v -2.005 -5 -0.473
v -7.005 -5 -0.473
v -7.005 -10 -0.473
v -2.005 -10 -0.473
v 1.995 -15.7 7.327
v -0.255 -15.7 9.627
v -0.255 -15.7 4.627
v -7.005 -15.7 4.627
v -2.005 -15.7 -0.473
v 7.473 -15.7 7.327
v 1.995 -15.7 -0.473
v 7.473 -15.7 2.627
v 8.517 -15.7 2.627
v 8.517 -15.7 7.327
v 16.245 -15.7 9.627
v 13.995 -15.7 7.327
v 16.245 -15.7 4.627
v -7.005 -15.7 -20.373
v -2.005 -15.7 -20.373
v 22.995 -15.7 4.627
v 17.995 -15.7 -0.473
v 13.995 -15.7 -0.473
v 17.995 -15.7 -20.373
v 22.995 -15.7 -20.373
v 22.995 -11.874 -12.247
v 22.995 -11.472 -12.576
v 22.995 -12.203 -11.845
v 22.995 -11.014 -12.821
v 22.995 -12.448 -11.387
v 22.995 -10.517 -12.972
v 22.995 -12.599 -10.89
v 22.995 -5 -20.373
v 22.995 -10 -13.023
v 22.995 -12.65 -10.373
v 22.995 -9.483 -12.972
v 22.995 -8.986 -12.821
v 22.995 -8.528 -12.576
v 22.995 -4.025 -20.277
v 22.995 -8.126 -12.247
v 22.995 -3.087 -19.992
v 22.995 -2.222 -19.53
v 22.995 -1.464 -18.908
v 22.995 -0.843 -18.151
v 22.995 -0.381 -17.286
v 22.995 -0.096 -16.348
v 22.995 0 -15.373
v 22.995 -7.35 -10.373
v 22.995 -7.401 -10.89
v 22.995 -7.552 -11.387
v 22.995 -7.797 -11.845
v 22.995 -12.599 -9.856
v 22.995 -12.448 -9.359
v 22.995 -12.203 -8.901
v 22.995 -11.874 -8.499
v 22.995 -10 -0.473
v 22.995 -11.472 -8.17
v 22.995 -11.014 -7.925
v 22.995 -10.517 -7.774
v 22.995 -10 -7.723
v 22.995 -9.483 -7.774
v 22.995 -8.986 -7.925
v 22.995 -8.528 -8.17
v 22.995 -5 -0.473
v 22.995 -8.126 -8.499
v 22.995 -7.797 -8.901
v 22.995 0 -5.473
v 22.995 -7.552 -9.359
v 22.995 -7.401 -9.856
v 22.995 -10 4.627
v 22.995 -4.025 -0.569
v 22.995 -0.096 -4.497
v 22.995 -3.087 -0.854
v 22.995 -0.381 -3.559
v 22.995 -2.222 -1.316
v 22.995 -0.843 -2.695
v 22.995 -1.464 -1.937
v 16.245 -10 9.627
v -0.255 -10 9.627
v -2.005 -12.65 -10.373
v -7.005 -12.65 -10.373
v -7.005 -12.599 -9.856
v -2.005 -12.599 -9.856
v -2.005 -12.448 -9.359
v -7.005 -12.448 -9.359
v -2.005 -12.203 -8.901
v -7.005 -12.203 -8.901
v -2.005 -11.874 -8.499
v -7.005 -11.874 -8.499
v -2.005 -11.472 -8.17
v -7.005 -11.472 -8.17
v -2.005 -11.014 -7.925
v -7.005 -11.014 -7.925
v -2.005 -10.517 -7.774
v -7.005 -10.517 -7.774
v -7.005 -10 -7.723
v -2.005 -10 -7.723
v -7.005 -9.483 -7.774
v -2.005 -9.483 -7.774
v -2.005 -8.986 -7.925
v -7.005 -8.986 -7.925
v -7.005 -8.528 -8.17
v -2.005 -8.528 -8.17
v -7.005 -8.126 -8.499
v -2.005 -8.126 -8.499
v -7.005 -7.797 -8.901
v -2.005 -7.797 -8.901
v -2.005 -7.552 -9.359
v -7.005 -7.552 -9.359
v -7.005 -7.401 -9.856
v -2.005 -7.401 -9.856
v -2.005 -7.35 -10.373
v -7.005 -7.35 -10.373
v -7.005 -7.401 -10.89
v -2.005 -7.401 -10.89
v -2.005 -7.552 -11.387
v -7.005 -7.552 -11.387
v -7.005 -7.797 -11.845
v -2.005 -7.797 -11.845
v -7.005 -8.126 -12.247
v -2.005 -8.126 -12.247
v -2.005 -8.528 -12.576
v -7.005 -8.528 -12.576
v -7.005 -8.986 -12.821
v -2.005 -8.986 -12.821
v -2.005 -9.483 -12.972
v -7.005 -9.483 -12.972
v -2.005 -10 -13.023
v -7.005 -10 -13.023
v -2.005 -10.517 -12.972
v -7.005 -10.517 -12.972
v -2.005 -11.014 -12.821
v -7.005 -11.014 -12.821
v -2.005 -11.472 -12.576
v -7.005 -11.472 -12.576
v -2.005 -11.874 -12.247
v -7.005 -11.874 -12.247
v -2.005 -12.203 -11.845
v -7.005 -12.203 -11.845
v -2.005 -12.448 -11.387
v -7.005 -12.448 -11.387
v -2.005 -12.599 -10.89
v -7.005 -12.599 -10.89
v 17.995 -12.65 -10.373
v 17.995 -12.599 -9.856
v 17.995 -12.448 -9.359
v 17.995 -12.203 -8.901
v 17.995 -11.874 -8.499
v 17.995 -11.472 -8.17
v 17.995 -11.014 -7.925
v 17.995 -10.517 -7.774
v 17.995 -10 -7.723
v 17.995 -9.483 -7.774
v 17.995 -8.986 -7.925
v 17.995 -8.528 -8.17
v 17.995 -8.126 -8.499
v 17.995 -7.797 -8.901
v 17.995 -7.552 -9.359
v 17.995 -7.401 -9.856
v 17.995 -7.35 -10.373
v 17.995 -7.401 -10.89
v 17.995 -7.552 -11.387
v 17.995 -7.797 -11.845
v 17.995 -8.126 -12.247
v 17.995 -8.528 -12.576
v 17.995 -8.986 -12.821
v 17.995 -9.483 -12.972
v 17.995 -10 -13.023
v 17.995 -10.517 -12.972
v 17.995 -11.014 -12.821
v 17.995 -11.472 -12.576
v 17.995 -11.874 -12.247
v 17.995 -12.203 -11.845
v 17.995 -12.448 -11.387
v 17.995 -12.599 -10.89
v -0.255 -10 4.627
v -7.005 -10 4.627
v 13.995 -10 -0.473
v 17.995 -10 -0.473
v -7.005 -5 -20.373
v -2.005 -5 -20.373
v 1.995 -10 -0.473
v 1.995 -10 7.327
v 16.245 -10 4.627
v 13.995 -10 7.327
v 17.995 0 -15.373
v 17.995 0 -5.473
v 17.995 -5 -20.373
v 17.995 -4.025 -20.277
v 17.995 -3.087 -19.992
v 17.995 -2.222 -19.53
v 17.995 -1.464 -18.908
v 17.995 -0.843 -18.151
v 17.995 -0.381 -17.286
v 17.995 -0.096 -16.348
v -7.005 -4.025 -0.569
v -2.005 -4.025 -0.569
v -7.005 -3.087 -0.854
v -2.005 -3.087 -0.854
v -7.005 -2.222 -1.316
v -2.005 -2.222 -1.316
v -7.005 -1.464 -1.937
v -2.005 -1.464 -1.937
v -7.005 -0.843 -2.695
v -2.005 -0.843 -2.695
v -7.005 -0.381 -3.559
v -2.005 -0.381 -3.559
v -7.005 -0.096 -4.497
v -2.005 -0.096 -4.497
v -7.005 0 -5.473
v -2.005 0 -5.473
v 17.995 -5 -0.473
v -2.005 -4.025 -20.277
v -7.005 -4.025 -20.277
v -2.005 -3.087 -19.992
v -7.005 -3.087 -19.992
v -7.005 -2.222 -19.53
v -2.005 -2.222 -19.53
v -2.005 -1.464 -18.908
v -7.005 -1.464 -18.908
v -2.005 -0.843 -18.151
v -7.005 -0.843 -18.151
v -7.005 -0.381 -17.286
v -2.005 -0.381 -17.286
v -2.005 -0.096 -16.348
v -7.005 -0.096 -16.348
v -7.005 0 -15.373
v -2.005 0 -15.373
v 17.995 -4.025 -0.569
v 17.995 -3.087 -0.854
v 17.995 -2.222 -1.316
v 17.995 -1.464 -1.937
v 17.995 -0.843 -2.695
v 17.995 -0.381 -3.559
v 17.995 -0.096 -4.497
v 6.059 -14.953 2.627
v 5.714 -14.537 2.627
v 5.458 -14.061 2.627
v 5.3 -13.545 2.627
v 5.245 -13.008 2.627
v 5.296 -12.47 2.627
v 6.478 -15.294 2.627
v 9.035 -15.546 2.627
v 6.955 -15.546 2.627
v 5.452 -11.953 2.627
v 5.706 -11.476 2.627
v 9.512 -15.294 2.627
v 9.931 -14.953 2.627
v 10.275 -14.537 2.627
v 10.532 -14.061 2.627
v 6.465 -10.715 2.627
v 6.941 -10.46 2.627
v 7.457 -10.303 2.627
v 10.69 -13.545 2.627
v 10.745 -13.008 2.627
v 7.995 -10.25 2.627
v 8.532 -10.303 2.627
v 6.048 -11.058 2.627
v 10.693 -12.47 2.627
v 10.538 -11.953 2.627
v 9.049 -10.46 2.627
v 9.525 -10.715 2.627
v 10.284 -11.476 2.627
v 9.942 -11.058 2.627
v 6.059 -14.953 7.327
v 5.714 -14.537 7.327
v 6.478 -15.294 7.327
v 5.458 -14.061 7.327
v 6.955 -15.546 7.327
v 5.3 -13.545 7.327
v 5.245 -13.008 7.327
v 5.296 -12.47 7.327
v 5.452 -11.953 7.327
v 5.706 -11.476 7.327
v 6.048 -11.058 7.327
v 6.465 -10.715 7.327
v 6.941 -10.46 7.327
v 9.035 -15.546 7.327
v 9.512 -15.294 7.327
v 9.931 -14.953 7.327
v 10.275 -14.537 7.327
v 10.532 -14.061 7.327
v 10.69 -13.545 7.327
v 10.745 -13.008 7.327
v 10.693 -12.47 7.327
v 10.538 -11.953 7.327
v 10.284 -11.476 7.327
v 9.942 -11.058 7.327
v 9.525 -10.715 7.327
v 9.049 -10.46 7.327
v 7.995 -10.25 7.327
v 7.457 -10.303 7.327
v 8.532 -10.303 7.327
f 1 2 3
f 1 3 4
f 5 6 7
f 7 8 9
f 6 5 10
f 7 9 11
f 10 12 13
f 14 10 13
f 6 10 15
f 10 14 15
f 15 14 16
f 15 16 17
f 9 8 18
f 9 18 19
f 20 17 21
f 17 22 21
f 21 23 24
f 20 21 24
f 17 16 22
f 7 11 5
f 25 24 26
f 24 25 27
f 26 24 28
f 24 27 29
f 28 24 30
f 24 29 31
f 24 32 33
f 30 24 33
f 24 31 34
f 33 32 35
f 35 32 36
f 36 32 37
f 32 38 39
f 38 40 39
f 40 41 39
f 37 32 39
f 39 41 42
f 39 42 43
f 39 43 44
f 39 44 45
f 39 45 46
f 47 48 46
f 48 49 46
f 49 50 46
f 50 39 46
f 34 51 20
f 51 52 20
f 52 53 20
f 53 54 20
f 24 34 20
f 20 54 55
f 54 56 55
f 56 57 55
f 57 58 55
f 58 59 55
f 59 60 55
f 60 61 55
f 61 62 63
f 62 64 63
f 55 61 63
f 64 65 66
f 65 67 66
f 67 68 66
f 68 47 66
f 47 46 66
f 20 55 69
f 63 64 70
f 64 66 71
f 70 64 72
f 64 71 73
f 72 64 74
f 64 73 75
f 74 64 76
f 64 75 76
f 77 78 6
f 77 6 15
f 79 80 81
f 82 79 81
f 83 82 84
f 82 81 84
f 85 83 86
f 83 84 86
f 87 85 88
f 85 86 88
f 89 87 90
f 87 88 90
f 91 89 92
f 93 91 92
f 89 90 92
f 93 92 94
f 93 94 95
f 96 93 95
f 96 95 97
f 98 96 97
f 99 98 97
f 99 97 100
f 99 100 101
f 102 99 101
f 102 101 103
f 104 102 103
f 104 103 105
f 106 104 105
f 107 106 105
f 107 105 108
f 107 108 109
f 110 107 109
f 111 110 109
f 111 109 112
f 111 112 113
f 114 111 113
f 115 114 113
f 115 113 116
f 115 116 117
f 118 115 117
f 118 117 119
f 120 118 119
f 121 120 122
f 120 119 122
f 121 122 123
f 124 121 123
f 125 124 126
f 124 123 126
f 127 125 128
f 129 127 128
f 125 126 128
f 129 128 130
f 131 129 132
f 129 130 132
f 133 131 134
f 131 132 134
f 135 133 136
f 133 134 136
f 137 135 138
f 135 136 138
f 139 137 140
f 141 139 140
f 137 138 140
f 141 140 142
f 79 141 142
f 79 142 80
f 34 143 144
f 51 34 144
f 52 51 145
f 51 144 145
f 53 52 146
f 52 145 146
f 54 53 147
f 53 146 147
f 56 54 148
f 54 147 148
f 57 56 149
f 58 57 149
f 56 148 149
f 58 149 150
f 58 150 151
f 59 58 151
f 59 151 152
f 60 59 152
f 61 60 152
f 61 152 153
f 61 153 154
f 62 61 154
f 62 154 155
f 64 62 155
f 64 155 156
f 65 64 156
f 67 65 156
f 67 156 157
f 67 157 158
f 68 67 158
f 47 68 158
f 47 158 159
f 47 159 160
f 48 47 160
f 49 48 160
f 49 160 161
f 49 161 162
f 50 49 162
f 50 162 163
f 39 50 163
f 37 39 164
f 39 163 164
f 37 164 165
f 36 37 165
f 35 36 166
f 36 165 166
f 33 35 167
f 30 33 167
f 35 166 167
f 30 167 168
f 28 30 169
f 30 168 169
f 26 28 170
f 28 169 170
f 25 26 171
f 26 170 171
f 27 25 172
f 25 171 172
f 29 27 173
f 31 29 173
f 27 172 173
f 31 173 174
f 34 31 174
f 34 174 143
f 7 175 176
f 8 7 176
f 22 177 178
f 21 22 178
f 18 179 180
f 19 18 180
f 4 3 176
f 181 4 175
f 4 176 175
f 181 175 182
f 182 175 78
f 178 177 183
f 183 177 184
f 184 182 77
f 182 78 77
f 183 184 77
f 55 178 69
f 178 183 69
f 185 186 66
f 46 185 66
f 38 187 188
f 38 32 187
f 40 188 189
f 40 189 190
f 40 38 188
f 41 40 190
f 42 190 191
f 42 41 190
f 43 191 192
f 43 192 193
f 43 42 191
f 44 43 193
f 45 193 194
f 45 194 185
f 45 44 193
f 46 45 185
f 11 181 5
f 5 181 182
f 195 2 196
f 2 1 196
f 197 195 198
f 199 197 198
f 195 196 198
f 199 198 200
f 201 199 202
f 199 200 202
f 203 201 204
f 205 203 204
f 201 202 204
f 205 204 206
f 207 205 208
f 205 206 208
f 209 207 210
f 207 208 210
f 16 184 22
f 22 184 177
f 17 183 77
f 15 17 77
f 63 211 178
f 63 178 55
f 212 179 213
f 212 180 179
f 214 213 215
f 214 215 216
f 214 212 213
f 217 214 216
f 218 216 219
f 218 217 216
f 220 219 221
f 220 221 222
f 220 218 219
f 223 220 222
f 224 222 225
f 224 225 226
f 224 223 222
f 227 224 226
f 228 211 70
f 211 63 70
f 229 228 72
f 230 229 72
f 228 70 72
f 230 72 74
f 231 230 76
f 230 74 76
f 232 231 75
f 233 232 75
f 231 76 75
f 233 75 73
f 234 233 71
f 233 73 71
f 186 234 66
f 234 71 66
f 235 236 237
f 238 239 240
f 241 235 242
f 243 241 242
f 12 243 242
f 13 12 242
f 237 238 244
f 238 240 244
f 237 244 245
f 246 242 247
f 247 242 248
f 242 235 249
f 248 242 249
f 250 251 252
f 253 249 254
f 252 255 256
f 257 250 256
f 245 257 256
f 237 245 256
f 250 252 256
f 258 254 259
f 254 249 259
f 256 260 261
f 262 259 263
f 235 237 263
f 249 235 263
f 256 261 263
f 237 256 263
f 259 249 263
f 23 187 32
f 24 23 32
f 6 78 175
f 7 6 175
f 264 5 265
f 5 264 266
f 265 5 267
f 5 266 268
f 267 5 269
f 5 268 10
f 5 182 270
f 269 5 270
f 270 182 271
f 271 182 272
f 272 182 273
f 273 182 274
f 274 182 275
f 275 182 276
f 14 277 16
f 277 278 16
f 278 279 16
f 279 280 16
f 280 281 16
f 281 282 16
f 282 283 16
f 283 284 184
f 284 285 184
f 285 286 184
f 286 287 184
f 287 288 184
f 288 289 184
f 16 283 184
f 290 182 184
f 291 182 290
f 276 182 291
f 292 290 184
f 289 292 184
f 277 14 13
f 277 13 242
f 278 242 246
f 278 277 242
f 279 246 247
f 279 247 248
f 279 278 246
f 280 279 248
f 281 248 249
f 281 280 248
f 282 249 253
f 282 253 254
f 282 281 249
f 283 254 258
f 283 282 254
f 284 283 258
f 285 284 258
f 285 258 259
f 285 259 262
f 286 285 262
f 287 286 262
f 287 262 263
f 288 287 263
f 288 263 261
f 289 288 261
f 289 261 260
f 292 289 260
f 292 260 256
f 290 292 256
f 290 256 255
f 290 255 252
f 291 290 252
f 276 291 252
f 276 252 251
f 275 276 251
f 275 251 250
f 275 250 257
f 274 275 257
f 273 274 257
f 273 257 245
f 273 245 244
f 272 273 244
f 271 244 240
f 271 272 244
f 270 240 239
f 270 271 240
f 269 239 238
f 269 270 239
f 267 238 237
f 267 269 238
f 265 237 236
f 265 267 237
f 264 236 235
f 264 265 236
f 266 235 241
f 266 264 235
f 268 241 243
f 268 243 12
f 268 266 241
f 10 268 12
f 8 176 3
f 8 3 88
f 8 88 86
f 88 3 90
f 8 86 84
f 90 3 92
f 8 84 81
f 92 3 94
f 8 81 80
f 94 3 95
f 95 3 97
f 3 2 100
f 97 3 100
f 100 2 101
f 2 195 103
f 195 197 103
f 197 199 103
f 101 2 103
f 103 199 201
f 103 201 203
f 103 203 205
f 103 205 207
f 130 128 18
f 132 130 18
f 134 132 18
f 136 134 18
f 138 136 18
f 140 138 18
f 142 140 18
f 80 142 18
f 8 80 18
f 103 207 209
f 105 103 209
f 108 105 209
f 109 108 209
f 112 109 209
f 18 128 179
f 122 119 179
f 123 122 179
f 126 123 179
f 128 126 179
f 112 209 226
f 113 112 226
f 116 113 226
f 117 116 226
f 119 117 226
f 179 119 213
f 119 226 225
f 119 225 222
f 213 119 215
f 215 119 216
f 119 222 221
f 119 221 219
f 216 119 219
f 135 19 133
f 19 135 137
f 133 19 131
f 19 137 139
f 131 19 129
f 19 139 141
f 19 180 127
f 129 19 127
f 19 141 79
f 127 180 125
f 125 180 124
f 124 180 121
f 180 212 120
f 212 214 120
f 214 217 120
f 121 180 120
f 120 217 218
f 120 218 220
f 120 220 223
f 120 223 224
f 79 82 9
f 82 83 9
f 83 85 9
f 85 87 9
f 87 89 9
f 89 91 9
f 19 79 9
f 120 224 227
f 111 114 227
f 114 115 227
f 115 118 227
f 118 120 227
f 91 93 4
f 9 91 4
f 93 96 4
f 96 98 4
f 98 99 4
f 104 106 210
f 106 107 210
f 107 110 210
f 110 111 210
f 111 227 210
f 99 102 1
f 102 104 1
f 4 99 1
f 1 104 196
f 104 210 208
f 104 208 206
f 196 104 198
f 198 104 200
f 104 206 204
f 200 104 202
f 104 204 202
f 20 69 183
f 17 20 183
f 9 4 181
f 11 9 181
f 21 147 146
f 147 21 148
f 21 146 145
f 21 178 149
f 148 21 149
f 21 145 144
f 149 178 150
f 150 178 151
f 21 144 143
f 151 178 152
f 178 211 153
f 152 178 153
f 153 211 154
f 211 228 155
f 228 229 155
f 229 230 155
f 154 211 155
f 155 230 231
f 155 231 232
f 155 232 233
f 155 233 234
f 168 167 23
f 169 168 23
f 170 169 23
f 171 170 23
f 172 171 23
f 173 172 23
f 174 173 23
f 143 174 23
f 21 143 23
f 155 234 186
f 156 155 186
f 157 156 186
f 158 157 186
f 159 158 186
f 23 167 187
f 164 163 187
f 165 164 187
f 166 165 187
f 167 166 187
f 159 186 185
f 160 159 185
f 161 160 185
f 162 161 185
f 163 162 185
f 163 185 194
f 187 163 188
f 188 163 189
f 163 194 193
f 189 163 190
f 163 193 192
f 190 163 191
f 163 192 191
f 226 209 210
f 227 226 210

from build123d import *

# Parameters (mm, degrees)
F1_DEPTH  = 20
F2_R      = 2.65
F3_DEPTH  = 30.001
F4_R      = 2.75
F5_DEPTH  = 7
F6_W      = 30
F6_H      = 10
F7_DEPTH  = 10.1
F9_R      = 5
F8_W      = 30
F8_H      = 4.3
F10_DEPTH = 30.001
F11_R     = 5


with BuildPart() as f1:
    # F0 (on Front) → F1 (new body)
    with BuildSketch(Plane.XZ):
        Polygon((-0.255054, 4.627101), (-7.005054, 4.627101), (-7.005054, -20.372899), (-2.005054, -20.372899), (-2.005054, -0.472899), (1.994946, -0.472899), (1.994946, 7.327101), (13.994946, 7.327101), (13.994946, -0.472899), (17.994946, -0.472899), (17.994946, -20.372899), (22.994946, -20.372899), (22.994946, 4.627101), (16.244946, 4.627101), (16.244946, 9.627101), (-0.255054, 9.627101), align=None)
    extrude(amount=F1_DEPTH)

    # F2 (on face) → F3 (cut, through all)
    with BuildSketch(Plane(origin=(-7.005054, 0, 0), x_dir=(0, -1, 0), z_dir=(-1, 0, 0))):
        with Locations((10, -10.372899)):
            Circle(F2_R)
    extrude(amount=-F3_DEPTH, mode=Mode.SUBTRACT)

    # F4 (on face) → F5 (join)
    with BuildSketch(Plane.XY.offset(9.627101)):
        with Locations((7.994946, -13)):
            Circle(F4_R)
    extrude(amount=-F5_DEPTH)

    # F6 (on face) → F7 (cut, through all)
    with BuildSketch(Plane.XY.offset(9.627101)):
        with Locations((7.994946, -5)):
            Rectangle(F6_W, F6_H)
    extrude(amount=-F7_DEPTH, mode=Mode.SUBTRACT)

    # F9
    f9_edges = [f1.edges().sort_by_distance(p)[0] for p in [
        (20.494946, 0, -0.472899),
        (-4.505054, 0, -0.472899),
    ]]
    fillet(f9_edges, radius=F9_R)

    # F8 (on face) → F10 (cut, through all)
    with BuildSketch(Plane(origin=(0, 0, -20.372899), x_dir=(1, 0, 0), z_dir=(0, 0, -1))):
        with Locations((7.994946, 17.85)):
            Rectangle(F8_W, F8_H)
    extrude(amount=-F10_DEPTH, mode=Mode.SUBTRACT)

    # F11
    f11_edges = [f1.edges().sort_by_distance(p)[0] for p in [
        (20.494946, 0, -20.372899),
        (-4.505054, 0, -20.372899),
    ]]
    fillet(f11_edges, radius=F11_R)


solid = f1.part
